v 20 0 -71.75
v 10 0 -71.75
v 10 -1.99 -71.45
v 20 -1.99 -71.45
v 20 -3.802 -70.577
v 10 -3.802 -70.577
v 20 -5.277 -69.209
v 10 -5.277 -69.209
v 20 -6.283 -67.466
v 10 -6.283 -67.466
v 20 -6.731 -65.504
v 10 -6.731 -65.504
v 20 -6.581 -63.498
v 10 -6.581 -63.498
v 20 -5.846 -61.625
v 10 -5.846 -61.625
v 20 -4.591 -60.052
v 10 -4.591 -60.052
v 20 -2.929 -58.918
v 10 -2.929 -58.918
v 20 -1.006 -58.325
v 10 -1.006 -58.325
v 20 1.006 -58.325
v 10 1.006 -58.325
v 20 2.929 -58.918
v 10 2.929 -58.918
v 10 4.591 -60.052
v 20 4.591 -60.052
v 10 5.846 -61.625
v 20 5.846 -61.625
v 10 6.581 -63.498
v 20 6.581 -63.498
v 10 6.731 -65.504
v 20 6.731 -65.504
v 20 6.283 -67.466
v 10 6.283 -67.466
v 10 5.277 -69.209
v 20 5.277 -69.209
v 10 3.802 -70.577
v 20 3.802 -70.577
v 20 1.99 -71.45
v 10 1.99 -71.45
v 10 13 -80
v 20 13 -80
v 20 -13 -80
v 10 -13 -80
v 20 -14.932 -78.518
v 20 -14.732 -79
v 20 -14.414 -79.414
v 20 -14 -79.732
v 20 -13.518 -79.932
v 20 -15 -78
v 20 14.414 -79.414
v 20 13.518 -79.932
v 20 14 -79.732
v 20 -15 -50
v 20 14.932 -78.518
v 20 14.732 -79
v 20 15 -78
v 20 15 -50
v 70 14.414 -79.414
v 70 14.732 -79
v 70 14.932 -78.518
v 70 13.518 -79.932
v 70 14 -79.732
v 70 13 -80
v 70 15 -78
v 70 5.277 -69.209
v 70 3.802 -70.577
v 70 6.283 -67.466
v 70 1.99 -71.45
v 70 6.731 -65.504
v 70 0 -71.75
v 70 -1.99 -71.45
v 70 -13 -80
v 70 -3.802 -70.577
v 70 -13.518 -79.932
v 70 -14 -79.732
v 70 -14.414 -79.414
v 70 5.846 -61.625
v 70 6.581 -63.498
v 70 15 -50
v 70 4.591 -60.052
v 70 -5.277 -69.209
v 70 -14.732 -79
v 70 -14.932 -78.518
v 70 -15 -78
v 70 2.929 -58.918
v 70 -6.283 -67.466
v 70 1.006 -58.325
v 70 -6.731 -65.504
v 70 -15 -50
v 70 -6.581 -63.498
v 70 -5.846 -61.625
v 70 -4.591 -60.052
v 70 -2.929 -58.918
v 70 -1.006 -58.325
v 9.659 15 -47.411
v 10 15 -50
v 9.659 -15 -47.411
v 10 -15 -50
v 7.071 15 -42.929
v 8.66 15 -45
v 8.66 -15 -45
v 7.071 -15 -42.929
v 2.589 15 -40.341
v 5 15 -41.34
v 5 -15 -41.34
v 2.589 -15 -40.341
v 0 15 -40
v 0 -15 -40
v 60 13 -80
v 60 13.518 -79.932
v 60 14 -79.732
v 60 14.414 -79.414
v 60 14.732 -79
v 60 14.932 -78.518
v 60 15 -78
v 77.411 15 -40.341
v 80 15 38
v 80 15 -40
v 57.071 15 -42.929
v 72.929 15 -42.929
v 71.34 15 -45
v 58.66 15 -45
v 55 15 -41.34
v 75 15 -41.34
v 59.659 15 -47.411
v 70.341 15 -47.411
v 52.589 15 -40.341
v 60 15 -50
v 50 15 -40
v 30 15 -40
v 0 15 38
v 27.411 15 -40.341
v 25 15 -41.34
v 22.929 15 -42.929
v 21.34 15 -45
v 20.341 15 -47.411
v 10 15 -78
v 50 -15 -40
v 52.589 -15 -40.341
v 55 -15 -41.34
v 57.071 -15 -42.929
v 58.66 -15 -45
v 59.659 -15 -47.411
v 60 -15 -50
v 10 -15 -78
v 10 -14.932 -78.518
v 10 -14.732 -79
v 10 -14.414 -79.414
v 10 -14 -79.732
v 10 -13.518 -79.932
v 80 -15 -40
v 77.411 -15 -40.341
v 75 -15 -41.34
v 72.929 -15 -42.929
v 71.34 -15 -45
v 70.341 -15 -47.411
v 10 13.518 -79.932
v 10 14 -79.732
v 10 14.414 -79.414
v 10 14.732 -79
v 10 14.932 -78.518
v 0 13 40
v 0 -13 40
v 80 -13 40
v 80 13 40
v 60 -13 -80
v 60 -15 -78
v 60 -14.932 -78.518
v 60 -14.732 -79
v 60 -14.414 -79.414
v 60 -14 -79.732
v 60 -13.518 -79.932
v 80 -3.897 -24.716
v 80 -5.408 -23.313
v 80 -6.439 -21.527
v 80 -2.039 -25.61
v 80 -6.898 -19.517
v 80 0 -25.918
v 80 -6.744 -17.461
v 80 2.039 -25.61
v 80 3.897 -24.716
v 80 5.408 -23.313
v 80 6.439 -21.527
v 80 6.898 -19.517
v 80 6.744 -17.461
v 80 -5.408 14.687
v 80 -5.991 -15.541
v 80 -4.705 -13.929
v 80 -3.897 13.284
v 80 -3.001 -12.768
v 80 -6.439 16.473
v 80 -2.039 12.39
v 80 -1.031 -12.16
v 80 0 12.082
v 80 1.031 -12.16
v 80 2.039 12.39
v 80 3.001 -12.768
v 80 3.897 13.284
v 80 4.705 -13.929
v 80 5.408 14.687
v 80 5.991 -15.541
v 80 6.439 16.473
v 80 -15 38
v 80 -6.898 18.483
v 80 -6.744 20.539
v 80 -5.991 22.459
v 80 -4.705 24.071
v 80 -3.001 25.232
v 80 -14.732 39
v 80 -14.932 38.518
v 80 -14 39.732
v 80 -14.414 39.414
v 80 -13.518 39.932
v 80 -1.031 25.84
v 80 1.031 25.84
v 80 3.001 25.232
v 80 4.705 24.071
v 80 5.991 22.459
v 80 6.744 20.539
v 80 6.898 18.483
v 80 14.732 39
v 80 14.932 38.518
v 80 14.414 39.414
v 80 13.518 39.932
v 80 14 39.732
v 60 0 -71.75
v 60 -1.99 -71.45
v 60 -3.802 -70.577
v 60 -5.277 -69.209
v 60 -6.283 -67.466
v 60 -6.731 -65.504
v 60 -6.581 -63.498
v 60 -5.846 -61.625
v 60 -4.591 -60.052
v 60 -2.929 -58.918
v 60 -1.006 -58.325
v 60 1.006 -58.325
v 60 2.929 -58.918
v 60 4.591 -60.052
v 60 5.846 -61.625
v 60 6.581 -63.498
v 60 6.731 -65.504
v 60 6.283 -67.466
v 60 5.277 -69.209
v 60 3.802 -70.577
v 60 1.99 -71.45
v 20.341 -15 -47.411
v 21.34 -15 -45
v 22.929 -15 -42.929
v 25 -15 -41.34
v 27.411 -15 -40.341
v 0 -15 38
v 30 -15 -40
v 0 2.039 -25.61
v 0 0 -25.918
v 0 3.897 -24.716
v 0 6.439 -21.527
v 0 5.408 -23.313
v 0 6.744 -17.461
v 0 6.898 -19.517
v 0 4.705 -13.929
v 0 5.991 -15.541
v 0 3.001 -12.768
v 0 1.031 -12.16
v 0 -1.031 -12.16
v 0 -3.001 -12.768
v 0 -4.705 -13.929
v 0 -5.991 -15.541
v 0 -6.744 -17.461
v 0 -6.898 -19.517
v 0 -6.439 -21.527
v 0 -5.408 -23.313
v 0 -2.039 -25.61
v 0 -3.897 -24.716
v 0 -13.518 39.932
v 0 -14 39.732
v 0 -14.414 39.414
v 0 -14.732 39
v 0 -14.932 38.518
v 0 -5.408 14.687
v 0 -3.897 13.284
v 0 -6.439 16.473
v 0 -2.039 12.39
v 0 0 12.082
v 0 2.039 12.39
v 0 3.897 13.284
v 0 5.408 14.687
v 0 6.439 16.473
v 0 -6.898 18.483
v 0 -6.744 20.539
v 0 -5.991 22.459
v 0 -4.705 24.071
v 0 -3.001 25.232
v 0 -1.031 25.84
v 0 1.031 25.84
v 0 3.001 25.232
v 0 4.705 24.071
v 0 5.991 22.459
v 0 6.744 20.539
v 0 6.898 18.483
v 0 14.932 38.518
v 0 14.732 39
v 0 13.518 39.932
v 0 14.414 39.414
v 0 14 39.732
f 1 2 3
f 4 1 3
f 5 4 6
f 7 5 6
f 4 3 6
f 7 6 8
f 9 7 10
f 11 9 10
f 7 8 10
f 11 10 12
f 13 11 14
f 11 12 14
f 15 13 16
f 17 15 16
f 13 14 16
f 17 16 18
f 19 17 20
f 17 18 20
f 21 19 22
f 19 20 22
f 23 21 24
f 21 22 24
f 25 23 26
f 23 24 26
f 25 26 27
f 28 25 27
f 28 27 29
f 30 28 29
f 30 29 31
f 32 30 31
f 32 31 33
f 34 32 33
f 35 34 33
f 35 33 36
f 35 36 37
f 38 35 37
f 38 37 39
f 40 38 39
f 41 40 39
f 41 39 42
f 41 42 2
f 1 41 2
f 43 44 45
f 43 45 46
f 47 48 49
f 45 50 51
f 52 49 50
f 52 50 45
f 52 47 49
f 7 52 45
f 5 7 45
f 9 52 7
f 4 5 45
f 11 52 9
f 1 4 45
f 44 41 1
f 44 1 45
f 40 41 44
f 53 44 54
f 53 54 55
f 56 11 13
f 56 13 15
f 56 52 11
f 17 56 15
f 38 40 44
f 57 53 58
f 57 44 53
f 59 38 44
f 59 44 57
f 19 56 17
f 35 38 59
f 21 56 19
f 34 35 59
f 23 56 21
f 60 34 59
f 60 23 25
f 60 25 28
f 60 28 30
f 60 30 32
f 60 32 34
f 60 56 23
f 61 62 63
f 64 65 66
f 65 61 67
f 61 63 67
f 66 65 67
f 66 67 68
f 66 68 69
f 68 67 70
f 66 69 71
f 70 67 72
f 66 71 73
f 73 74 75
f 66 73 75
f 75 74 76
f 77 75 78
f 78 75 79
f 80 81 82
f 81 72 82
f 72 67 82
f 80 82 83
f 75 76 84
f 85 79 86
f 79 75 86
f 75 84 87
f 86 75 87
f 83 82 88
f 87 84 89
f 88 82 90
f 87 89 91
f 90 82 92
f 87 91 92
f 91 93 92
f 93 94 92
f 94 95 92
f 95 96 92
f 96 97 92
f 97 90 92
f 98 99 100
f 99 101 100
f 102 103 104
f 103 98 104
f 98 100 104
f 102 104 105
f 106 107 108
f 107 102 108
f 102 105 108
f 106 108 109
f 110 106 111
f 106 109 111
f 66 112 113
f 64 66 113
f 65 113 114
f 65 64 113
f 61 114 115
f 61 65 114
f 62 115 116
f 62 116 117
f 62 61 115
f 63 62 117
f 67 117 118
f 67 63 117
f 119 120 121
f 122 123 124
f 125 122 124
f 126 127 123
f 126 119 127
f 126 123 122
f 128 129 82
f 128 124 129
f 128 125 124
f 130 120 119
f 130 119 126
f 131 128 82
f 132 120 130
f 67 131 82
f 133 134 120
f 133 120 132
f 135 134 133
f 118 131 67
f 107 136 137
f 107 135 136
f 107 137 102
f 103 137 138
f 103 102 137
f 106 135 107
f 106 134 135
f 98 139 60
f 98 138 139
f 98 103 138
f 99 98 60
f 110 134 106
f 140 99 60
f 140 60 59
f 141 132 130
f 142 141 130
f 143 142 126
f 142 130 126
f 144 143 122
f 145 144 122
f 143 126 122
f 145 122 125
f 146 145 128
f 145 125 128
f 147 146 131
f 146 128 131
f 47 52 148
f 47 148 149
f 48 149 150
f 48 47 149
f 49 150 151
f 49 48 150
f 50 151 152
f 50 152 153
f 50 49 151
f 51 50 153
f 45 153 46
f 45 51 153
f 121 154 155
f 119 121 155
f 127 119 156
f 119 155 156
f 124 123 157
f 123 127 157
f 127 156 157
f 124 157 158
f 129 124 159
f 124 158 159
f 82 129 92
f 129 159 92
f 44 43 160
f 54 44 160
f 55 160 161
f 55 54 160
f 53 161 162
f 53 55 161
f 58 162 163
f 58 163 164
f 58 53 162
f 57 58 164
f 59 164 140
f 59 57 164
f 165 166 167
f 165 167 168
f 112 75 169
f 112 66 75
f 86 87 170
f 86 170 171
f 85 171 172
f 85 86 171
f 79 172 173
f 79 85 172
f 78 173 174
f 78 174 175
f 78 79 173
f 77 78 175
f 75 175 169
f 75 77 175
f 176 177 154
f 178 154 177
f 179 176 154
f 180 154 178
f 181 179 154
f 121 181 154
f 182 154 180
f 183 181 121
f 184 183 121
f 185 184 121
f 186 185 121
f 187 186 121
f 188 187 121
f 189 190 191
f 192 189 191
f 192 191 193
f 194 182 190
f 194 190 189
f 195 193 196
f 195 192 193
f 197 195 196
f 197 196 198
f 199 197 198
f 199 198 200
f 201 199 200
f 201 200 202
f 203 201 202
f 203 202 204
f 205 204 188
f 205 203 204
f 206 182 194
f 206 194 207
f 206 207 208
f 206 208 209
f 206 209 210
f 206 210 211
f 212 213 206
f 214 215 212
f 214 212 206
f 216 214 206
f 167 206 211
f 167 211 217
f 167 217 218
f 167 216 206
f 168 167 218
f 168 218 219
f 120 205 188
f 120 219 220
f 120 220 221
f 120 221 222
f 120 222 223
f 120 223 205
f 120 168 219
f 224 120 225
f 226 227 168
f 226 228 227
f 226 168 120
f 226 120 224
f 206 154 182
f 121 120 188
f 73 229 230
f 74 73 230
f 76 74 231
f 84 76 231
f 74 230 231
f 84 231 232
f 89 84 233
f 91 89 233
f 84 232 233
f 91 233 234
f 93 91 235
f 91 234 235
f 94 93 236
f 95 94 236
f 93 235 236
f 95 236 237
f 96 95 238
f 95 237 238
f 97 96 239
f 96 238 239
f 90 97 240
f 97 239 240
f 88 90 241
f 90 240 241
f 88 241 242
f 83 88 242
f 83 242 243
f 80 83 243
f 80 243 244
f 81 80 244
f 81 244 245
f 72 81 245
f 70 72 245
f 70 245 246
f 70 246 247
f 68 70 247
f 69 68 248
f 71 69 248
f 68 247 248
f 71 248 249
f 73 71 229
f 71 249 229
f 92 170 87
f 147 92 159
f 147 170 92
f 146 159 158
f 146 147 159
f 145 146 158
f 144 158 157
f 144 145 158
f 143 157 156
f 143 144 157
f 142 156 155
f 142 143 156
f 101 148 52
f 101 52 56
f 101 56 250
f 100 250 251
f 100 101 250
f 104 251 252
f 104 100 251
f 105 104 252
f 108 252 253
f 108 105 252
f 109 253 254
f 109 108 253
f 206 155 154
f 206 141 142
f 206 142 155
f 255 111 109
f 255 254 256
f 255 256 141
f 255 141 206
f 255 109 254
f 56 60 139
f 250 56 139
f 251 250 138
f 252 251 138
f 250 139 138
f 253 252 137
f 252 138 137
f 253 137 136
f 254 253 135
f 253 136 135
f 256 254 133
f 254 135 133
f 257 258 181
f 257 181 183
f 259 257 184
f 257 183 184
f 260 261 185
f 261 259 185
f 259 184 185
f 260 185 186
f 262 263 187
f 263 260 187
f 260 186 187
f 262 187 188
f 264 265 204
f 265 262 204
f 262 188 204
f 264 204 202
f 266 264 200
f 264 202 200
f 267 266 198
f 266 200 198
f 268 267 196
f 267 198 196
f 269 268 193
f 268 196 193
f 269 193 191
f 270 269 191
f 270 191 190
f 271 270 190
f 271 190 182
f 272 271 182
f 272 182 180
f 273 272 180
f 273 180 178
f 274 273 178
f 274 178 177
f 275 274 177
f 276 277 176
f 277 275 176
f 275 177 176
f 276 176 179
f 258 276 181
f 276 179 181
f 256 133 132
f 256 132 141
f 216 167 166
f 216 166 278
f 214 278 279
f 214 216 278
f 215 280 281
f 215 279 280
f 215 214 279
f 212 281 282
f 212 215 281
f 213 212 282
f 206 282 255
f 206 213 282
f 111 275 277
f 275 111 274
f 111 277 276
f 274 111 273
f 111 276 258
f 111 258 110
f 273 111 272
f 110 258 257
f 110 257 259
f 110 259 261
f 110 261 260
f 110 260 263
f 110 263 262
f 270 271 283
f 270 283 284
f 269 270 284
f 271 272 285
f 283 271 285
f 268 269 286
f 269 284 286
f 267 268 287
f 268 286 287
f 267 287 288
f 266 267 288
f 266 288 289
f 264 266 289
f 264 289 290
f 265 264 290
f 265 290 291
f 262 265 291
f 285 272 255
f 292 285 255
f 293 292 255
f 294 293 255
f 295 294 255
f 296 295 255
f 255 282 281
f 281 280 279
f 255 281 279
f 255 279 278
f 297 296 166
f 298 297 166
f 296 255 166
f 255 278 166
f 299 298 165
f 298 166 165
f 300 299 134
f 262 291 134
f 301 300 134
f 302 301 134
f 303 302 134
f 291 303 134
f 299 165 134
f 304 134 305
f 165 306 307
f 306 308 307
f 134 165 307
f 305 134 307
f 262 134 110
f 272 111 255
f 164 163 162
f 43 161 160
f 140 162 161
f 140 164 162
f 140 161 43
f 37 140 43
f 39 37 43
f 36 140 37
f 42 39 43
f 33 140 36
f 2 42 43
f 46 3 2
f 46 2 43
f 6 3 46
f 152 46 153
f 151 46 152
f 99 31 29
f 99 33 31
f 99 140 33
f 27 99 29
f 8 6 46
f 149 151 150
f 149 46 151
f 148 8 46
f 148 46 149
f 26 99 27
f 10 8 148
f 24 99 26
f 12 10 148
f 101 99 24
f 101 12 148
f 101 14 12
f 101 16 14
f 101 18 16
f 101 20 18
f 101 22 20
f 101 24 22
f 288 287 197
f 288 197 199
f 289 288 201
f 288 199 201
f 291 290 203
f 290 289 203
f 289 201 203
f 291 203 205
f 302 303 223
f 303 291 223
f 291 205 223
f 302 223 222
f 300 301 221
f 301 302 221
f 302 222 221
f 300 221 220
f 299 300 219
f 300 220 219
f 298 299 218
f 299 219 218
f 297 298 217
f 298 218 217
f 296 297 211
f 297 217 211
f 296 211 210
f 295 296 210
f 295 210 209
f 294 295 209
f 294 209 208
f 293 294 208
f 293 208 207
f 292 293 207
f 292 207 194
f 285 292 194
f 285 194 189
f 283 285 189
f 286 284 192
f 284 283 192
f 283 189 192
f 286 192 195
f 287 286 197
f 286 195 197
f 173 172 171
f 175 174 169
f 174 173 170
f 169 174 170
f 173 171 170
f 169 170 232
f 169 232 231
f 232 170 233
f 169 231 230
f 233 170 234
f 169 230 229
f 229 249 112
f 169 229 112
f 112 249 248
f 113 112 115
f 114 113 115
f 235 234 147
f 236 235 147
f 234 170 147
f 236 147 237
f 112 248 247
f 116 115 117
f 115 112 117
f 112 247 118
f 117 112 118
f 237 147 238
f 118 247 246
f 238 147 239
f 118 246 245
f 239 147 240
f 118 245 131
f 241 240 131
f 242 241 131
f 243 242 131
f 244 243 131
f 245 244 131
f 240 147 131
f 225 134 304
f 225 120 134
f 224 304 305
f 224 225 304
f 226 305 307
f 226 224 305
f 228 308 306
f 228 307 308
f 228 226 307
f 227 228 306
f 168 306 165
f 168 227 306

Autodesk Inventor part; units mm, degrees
ref_plane "YZ Plane" through (0, 0, 0) normal (1, 0, 0) x (0, 1, 0)
ref_plane "XZ Plane" through (0, 0, 0) normal (0, 1, 0) x (-1, 0, 0)
sketch "Sketch1" plane through (0, 0, 0) normal (1, 0, 0) x (0, 1, 0)
  line L0 (-15, 40) -> (15, 40)
  line L1 (15, 40) -> (15, -40)
  line L2 (15, -40) -> (-15, -40)
  line L3 (-15, -40) -> (-15, 40)
  line L4 (-15, 40) -> (15, -40) construction
  line L5 (15, 40) -> (-15, -40) construction
  point P0 (0, 0)
  dimension "d0" = 30
  dimension "d1" = 80
extrude "Extrusion1" add sketch "Sketch1" along normal blind 80
sketch "Sketch2" plane through (80, 0, 0) normal (1, 0, 0) x (0, 0, -1)
  line L0 (-40, 15) -> (-40, -15) projected
  line L1 (-40, 0) -> (40, 0)
  line L2 (40, -15) -> (40, 15) projected
  line L3 (40, 15) -> (-40, 15) projected
  line L4 (0, 15) -> (0, -15)
  line L5 (-40, -15) -> (40, -15) projected
  point P0 (0, 0)
  point P1 (-19, 0)
  point P2 (19, 0)
  dimension "d4" = 19
hole "Hole1" at (80, 0, 19) at (80, 0, -19) direction (-1, 0, 0) diameter 13.835 depth 40 tip angle 118 thread size "M16x2" class "6H" standard "ISO Metric profile"
ref_plane "Work Plane1" through (40, 0, 0) normal (1, 0, 0) x (0, 0, -1)
mirror "Mirror1" about plane through (40, 0, 0) normal (1, 0, 0) of "Hole1"
sketch "Sketch9" plane through (0, -15, -40) normal (0, 0, -1) x (-1, 0, 0)
  line L0 (0, 0) -> (-80, 0) projected
  line L1 (0, 30) -> (-80, 30) projected
  line L2 (-80, 0) -> (-80, 30) projected
  line L3 (-20, 30) -> (-10, 30)
  line L4 (-10, 30) -> (-10, 0)
  line L5 (-10, 0) -> (-20, 0)
  line L6 (-20, 0) -> (-20, 30)
  line L7 (0, 30) -> (0, 0) projected
  line L8 (-60, 30) -> (-70, 30)
  line L9 (-70, 30) -> (-70, 0)
  line L10 (-70, 0) -> (-60, 0)
  line L11 (-60, 0) -> (-60, 30)
  dimension "d78" = 10
  dimension "d79" = 10
  dimension "d80" = 10
  dimension "d81" = 10
extrude "Extrusion4" add sketch "Sketch9" along normal blind 40 contours L0 L6 L1 L4 | L0 L9 L1 L11
hole "Hole6" at (70, 0, -65) direction (-1, 0, 0) diameter 13.5 end through all
fillet "Fillet12" radius 10 4 edges at (70, 0, -40) (60, 0, -40) (20, 0, -40) (10, 0, -40)
fillet "Fillet14" radius 2 4 edges at (15, 15, -80) (15, -15, -80) (65, 15, -80) (65, -15, -80)
fillet "Fillet15" radius 2 2 edges at (40, 15, 40) (40, -15, 40)
properties part number "Profile_Middle_05"
